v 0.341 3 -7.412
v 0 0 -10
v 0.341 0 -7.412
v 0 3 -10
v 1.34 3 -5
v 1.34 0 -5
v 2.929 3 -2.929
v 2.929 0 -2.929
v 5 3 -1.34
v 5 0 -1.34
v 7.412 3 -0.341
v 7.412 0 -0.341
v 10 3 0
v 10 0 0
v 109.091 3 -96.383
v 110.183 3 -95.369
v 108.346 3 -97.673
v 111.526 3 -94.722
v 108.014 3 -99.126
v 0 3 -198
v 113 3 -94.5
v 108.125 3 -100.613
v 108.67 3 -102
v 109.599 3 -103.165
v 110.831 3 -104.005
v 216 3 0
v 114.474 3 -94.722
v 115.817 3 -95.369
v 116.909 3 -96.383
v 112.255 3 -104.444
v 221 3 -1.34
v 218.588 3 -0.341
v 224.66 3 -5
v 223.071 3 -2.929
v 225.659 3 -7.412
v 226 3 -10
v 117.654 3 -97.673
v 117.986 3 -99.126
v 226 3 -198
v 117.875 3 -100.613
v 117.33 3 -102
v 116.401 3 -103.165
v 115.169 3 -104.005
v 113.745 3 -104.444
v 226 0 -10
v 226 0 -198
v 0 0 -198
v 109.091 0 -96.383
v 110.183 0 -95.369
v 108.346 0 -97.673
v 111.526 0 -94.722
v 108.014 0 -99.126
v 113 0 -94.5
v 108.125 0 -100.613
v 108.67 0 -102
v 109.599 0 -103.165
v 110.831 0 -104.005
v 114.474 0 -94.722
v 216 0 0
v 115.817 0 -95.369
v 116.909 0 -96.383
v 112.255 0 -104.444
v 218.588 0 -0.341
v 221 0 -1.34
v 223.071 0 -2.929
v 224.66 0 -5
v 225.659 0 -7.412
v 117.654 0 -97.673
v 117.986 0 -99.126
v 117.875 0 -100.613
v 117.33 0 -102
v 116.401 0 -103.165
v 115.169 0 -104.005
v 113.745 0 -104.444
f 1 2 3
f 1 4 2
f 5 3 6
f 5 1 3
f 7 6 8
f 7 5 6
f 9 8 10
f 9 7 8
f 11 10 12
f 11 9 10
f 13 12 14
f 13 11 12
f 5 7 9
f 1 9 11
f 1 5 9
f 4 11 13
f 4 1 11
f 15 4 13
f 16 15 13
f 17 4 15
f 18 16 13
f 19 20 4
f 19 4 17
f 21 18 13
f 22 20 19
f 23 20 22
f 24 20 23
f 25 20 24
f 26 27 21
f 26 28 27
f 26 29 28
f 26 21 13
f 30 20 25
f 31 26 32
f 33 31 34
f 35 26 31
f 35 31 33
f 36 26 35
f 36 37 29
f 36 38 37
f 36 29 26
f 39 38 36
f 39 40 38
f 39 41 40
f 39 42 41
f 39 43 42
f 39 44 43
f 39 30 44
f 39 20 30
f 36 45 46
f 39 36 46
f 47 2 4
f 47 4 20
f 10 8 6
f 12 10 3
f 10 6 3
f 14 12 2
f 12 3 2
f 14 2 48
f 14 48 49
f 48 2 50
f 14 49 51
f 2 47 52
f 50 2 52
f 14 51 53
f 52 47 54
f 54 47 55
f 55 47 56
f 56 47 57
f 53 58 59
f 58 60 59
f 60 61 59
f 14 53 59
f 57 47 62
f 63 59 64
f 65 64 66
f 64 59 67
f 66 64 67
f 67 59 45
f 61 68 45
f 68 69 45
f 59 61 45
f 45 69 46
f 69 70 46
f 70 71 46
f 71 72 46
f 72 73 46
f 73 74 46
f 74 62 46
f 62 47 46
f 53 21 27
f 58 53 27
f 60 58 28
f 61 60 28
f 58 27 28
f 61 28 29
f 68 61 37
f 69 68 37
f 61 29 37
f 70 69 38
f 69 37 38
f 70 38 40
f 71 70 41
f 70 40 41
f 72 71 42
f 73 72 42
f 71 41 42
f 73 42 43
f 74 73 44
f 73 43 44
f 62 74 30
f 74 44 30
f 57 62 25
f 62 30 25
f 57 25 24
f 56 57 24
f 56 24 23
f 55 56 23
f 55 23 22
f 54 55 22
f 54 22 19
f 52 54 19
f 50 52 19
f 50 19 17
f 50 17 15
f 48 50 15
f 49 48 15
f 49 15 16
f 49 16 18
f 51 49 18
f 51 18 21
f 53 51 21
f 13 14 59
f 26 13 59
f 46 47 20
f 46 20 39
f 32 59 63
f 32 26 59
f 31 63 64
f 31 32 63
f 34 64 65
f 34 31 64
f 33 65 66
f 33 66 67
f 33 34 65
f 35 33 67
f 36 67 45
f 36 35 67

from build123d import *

# Parameters (mm, degrees)
SKETCH1_W           = 226
SKETCH1_H           = 198
BOSS_EXTRUDE1_DEPTH = 3
INPUT_FOR_SPEAKER_R = 5
CUT_EXTRUDE1_DEPTH  = 10
FILLET1_R           = 10


with BuildPart() as part:
    # Sketch1 → Boss-Extrude1 (new body)
    with BuildSketch(Plane(origin=(0, 0, 0), x_dir=(1, 0, 0), z_dir=(0, 1, 0))):
        with Locations((113, 99)):
            Rectangle(SKETCH1_W, SKETCH1_H)
    extrude(amount=BOSS_EXTRUDE1_DEPTH)

    # Input for speaker → Cut-Extrude1 (cut)
    with BuildSketch(Plane(origin=(0, 3, 0), x_dir=(1, 0, 0), z_dir=(0, 1, 0))):
        with Locations(Location((113, 99.5, 0), (0, 0, 270))):
            Circle(INPUT_FOR_SPEAKER_R)
    extrude(amount=-CUT_EXTRUDE1_DEPTH, mode=Mode.SUBTRACT)

    # Fillet1
    fillet1_edges = [part.edges().sort_by_distance(p)[0] for p in [
        (226, 1.5, 0),
        (0, 1.5, 0),
    ]]
    fillet(fillet1_edges, radius=FILLET1_R)


solid = part.part
